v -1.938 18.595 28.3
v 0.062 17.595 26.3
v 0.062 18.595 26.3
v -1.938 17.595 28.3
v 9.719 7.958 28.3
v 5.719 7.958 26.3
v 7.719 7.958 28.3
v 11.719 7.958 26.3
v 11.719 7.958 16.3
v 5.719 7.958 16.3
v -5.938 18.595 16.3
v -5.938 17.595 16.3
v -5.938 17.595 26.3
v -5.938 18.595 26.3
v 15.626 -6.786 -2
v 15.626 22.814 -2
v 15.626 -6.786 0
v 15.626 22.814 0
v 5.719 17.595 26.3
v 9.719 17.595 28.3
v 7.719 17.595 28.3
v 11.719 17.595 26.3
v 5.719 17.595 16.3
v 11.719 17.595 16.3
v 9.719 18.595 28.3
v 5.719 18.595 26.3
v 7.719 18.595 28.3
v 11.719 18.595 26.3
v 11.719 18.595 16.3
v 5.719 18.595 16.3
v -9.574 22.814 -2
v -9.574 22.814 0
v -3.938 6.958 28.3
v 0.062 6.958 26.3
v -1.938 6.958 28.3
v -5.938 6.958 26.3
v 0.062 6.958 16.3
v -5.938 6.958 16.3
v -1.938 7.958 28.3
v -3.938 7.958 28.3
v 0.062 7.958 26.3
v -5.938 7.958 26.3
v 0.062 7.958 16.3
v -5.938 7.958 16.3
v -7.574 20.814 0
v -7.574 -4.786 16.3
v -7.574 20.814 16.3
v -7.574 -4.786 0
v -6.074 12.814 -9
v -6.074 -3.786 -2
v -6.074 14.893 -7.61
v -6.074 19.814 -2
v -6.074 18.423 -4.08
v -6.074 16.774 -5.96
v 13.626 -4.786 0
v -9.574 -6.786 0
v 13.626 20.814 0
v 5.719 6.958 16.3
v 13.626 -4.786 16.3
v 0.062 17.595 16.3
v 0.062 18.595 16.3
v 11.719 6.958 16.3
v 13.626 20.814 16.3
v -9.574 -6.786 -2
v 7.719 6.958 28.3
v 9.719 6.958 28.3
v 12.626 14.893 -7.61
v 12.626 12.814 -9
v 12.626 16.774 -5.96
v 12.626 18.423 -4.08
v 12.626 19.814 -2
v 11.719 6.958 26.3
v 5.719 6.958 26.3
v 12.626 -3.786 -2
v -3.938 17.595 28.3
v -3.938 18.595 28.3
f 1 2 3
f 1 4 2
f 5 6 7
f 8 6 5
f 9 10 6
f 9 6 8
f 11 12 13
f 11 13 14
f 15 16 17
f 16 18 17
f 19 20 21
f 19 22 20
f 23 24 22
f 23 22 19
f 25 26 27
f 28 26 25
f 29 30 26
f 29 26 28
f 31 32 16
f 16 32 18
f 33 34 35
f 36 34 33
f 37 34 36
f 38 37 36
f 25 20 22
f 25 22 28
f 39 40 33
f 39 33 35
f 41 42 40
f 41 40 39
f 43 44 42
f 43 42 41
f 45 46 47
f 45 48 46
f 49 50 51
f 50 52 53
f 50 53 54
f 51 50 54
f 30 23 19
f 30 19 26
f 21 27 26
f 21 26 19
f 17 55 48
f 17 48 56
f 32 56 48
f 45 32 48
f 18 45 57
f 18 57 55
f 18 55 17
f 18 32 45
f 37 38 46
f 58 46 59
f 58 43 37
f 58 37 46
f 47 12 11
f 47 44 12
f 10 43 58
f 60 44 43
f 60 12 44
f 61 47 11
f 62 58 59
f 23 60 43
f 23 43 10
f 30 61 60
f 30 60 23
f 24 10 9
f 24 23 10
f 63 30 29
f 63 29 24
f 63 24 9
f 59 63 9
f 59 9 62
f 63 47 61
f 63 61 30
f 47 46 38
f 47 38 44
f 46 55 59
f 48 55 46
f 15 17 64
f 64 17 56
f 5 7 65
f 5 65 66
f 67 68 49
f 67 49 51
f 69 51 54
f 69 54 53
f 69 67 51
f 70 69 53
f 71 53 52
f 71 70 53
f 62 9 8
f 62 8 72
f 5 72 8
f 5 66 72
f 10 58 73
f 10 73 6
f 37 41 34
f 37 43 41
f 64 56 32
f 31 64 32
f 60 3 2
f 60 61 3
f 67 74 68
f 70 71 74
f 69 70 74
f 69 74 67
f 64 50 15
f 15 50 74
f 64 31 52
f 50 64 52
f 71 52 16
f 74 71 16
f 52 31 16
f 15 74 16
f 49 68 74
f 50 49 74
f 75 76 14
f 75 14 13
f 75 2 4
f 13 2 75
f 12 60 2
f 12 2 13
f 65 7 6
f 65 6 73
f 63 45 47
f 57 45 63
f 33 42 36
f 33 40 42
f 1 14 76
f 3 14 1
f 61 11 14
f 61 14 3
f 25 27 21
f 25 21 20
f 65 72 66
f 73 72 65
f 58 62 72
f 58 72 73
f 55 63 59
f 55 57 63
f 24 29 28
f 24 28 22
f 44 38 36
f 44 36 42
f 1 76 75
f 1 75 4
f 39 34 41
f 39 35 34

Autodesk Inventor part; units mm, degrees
ref_plane "YZ Plane" through (0, 0, 0) normal (1, 0, 0) x (0, 1, 0)
ref_plane "XZ Plane" through (0, 0, 0) normal (0, 1, 0) x (-1, 0, 0)
sketch "Szkic1" plane through (0, 0, 0) normal (0, 0, 1) x (1, 0, 0)
  line L0 (-7.5735, 20.8135) -> (13.6265, 20.8135)
  line L1 (13.6265, 20.8135) -> (13.6265, -4.7865)
  line L2 (13.6265, -4.7865) -> (-7.5735, -4.7865)
  line L3 (-7.5735, -4.7865) -> (-7.5735, 20.8135)
  line L4 (-9.5735, 22.8135) -> (15.6265, 22.8135)
  line L5 (15.6265, 22.8135) -> (15.6265, -6.7865)
  line L6 (15.6265, -6.7865) -> (-9.5735, -6.7865)
  line L7 (-9.5735, -6.7865) -> (-9.5735, 22.8135)
  point P0 (0, 0)
  dimension "d0" = 21.2
  dimension "d1" = 25.6
  dimension "d2" = 2
extrude "Wyciągnięcie proste1" add sketch "Szkic1" along normal blind 16.3 contours L0 L1 L2 L3
extrude "Wyciągnięcie proste2" add sketch "Szkic1" against normal blind 2 contours L0 L1 L2 L3 | L4 L5 L6 L7
ref_plane "Płaszczyzna konstrukcyjna1" through (12.6265, -6.7865, 0) normal (1, 0, 0) x (0, 0, -1)
sketch "Szkic2" plane through (12.6265, -6.7865, 0) normal (1, 0, 0) x (0, 0, -1)
  line L0 (2, 0) -> (2, 29.6) projected
  line L1 (0, 0) -> (2, 0) projected
  line L2 (0, 29.6) -> (2, 29.6) projected
  line L3 (0, 27.6) -> (-16.3, 27.6) projected
  line L4 (0, 2) -> (-16.3, 2) projected
  arc A0 (9, 19.6) -> (2, 26.6) centre (-7.5761, 10.0239) ccw
  line L5 (9, 19.6) -> (2, 3)
  point P0 (0, 6.7865)
  dimension "d8" = 7
  dimension "d9" = 29.6
  dimension "d10" = 2
  dimension "d11" = 10
  dimension "d12" = 1
  dimension "d13" = 1
extrude "Wyciągnięcie proste3" add sketch "Szkic2" against normal blind 18.7
sketch "Szkic3" plane through (0, 0, 16.3) normal (0, 0, 1) x (1, 0, 0)
  line L0 (13.6265, 20.8135) -> (-7.5735, 20.8135) projected
  line L1 (-7.5735, 20.8135) -> (-7.5735, -4.7865) projected
  line L2 (-7.5735, -4.7865) -> (13.6265, -4.7865) projected
  line L3 (13.6265, -4.7865) -> (13.6265, 20.8135) projected
  line L4 (-5.9377, 18.5947) -> (0.0623, 18.5947)
  line L5 (0.0623, 18.5947) -> (0.0623, 17.5947)
  line L6 (0.0623, 17.5947) -> (-5.9377, 17.5947)
  line L7 (-5.9377, 17.5947) -> (-5.9377, 18.5947)
  line L8 (5.7192, 18.5947) -> (11.7192, 18.5947)
  line L9 (11.7192, 18.5947) -> (11.7192, 17.5947)
  line L10 (11.7192, 17.5947) -> (5.7192, 17.5947)
  line L11 (5.7192, 17.5947) -> (5.7192, 18.5947)
  line L12 (-5.9377, 7.9577) -> (0.0623, 7.9577)
  line L13 (0.0623, 7.9577) -> (0.0623, 6.9577)
  line L14 (0.0623, 6.9577) -> (-5.9377, 6.9577)
  line L15 (-5.9377, 6.9577) -> (-5.9377, 7.9577)
  line L16 (5.7192, 7.9577) -> (11.7192, 7.9577)
  line L17 (11.7192, 7.9577) -> (11.7192, 6.9577)
  line L18 (11.7192, 6.9577) -> (5.7192, 6.9577)
  line L19 (5.7192, 6.9577) -> (5.7192, 7.9577)
  point P0 (0, 0)
  dimension "d16" = 6
  dimension "d17" = 1
  dimension "d18" = 6
  dimension "d19" = 1
  dimension "d20" = 6
  dimension "d21" = 1
  dimension "d22" = 6
  dimension "d23" = 1
extrude "Wyciągnięcie proste4" add sketch "Szkic3" along normal blind 12 contours L4 L5 L6 L7 | L8 L9 L10 L11 | L12 L13 L14 L15 | L16 L17 L18 L19
chamfer "Faza1" distance 2 angle 45 8 edges at (0.0623, 18.0947, 28.3) (-5.9377, 18.0947, 28.3) (11.7192, 18.0947, 28.3) (5.7192, 18.0947, 28.3) (11.7192, 7.4577, 28.3) (5.7192, 7.4577, 28.3) (0.0623, 7.4577, 28.3) (-5.9377, 7.4577, 28.3)
sketch "Szkic4" plane through (12.6265, -3.7865, -2) normal (0, -0.3886, -0.9214) x (-1, 0, 0)
  line L0 (6.8473, 17.5297) -> (14.0234, 17.5297) construction
  line L1 (14.0234, 17.5297) -> (14.0234, 9.4771) construction
  line L2 (14.0234, 9.4771) -> (6.8473, 9.4771) construction
  line L3 (6.8473, 9.4771) -> (6.8473, 17.5297) construction
  line L4 (8.3846, 8.6266) -> (9.6316, 8.6266) construction
  line L5 (9.6316, 8.6266) -> (9.6316, 4.3438) construction
  line L6 (9.6316, 4.3438) -> (8.3846, 4.3438) construction
  line L7 (8.3846, 4.3438) -> (8.3846, 8.6266) construction
properties part number "COTS_GENERIC_AC_Power_Switch_10A"
